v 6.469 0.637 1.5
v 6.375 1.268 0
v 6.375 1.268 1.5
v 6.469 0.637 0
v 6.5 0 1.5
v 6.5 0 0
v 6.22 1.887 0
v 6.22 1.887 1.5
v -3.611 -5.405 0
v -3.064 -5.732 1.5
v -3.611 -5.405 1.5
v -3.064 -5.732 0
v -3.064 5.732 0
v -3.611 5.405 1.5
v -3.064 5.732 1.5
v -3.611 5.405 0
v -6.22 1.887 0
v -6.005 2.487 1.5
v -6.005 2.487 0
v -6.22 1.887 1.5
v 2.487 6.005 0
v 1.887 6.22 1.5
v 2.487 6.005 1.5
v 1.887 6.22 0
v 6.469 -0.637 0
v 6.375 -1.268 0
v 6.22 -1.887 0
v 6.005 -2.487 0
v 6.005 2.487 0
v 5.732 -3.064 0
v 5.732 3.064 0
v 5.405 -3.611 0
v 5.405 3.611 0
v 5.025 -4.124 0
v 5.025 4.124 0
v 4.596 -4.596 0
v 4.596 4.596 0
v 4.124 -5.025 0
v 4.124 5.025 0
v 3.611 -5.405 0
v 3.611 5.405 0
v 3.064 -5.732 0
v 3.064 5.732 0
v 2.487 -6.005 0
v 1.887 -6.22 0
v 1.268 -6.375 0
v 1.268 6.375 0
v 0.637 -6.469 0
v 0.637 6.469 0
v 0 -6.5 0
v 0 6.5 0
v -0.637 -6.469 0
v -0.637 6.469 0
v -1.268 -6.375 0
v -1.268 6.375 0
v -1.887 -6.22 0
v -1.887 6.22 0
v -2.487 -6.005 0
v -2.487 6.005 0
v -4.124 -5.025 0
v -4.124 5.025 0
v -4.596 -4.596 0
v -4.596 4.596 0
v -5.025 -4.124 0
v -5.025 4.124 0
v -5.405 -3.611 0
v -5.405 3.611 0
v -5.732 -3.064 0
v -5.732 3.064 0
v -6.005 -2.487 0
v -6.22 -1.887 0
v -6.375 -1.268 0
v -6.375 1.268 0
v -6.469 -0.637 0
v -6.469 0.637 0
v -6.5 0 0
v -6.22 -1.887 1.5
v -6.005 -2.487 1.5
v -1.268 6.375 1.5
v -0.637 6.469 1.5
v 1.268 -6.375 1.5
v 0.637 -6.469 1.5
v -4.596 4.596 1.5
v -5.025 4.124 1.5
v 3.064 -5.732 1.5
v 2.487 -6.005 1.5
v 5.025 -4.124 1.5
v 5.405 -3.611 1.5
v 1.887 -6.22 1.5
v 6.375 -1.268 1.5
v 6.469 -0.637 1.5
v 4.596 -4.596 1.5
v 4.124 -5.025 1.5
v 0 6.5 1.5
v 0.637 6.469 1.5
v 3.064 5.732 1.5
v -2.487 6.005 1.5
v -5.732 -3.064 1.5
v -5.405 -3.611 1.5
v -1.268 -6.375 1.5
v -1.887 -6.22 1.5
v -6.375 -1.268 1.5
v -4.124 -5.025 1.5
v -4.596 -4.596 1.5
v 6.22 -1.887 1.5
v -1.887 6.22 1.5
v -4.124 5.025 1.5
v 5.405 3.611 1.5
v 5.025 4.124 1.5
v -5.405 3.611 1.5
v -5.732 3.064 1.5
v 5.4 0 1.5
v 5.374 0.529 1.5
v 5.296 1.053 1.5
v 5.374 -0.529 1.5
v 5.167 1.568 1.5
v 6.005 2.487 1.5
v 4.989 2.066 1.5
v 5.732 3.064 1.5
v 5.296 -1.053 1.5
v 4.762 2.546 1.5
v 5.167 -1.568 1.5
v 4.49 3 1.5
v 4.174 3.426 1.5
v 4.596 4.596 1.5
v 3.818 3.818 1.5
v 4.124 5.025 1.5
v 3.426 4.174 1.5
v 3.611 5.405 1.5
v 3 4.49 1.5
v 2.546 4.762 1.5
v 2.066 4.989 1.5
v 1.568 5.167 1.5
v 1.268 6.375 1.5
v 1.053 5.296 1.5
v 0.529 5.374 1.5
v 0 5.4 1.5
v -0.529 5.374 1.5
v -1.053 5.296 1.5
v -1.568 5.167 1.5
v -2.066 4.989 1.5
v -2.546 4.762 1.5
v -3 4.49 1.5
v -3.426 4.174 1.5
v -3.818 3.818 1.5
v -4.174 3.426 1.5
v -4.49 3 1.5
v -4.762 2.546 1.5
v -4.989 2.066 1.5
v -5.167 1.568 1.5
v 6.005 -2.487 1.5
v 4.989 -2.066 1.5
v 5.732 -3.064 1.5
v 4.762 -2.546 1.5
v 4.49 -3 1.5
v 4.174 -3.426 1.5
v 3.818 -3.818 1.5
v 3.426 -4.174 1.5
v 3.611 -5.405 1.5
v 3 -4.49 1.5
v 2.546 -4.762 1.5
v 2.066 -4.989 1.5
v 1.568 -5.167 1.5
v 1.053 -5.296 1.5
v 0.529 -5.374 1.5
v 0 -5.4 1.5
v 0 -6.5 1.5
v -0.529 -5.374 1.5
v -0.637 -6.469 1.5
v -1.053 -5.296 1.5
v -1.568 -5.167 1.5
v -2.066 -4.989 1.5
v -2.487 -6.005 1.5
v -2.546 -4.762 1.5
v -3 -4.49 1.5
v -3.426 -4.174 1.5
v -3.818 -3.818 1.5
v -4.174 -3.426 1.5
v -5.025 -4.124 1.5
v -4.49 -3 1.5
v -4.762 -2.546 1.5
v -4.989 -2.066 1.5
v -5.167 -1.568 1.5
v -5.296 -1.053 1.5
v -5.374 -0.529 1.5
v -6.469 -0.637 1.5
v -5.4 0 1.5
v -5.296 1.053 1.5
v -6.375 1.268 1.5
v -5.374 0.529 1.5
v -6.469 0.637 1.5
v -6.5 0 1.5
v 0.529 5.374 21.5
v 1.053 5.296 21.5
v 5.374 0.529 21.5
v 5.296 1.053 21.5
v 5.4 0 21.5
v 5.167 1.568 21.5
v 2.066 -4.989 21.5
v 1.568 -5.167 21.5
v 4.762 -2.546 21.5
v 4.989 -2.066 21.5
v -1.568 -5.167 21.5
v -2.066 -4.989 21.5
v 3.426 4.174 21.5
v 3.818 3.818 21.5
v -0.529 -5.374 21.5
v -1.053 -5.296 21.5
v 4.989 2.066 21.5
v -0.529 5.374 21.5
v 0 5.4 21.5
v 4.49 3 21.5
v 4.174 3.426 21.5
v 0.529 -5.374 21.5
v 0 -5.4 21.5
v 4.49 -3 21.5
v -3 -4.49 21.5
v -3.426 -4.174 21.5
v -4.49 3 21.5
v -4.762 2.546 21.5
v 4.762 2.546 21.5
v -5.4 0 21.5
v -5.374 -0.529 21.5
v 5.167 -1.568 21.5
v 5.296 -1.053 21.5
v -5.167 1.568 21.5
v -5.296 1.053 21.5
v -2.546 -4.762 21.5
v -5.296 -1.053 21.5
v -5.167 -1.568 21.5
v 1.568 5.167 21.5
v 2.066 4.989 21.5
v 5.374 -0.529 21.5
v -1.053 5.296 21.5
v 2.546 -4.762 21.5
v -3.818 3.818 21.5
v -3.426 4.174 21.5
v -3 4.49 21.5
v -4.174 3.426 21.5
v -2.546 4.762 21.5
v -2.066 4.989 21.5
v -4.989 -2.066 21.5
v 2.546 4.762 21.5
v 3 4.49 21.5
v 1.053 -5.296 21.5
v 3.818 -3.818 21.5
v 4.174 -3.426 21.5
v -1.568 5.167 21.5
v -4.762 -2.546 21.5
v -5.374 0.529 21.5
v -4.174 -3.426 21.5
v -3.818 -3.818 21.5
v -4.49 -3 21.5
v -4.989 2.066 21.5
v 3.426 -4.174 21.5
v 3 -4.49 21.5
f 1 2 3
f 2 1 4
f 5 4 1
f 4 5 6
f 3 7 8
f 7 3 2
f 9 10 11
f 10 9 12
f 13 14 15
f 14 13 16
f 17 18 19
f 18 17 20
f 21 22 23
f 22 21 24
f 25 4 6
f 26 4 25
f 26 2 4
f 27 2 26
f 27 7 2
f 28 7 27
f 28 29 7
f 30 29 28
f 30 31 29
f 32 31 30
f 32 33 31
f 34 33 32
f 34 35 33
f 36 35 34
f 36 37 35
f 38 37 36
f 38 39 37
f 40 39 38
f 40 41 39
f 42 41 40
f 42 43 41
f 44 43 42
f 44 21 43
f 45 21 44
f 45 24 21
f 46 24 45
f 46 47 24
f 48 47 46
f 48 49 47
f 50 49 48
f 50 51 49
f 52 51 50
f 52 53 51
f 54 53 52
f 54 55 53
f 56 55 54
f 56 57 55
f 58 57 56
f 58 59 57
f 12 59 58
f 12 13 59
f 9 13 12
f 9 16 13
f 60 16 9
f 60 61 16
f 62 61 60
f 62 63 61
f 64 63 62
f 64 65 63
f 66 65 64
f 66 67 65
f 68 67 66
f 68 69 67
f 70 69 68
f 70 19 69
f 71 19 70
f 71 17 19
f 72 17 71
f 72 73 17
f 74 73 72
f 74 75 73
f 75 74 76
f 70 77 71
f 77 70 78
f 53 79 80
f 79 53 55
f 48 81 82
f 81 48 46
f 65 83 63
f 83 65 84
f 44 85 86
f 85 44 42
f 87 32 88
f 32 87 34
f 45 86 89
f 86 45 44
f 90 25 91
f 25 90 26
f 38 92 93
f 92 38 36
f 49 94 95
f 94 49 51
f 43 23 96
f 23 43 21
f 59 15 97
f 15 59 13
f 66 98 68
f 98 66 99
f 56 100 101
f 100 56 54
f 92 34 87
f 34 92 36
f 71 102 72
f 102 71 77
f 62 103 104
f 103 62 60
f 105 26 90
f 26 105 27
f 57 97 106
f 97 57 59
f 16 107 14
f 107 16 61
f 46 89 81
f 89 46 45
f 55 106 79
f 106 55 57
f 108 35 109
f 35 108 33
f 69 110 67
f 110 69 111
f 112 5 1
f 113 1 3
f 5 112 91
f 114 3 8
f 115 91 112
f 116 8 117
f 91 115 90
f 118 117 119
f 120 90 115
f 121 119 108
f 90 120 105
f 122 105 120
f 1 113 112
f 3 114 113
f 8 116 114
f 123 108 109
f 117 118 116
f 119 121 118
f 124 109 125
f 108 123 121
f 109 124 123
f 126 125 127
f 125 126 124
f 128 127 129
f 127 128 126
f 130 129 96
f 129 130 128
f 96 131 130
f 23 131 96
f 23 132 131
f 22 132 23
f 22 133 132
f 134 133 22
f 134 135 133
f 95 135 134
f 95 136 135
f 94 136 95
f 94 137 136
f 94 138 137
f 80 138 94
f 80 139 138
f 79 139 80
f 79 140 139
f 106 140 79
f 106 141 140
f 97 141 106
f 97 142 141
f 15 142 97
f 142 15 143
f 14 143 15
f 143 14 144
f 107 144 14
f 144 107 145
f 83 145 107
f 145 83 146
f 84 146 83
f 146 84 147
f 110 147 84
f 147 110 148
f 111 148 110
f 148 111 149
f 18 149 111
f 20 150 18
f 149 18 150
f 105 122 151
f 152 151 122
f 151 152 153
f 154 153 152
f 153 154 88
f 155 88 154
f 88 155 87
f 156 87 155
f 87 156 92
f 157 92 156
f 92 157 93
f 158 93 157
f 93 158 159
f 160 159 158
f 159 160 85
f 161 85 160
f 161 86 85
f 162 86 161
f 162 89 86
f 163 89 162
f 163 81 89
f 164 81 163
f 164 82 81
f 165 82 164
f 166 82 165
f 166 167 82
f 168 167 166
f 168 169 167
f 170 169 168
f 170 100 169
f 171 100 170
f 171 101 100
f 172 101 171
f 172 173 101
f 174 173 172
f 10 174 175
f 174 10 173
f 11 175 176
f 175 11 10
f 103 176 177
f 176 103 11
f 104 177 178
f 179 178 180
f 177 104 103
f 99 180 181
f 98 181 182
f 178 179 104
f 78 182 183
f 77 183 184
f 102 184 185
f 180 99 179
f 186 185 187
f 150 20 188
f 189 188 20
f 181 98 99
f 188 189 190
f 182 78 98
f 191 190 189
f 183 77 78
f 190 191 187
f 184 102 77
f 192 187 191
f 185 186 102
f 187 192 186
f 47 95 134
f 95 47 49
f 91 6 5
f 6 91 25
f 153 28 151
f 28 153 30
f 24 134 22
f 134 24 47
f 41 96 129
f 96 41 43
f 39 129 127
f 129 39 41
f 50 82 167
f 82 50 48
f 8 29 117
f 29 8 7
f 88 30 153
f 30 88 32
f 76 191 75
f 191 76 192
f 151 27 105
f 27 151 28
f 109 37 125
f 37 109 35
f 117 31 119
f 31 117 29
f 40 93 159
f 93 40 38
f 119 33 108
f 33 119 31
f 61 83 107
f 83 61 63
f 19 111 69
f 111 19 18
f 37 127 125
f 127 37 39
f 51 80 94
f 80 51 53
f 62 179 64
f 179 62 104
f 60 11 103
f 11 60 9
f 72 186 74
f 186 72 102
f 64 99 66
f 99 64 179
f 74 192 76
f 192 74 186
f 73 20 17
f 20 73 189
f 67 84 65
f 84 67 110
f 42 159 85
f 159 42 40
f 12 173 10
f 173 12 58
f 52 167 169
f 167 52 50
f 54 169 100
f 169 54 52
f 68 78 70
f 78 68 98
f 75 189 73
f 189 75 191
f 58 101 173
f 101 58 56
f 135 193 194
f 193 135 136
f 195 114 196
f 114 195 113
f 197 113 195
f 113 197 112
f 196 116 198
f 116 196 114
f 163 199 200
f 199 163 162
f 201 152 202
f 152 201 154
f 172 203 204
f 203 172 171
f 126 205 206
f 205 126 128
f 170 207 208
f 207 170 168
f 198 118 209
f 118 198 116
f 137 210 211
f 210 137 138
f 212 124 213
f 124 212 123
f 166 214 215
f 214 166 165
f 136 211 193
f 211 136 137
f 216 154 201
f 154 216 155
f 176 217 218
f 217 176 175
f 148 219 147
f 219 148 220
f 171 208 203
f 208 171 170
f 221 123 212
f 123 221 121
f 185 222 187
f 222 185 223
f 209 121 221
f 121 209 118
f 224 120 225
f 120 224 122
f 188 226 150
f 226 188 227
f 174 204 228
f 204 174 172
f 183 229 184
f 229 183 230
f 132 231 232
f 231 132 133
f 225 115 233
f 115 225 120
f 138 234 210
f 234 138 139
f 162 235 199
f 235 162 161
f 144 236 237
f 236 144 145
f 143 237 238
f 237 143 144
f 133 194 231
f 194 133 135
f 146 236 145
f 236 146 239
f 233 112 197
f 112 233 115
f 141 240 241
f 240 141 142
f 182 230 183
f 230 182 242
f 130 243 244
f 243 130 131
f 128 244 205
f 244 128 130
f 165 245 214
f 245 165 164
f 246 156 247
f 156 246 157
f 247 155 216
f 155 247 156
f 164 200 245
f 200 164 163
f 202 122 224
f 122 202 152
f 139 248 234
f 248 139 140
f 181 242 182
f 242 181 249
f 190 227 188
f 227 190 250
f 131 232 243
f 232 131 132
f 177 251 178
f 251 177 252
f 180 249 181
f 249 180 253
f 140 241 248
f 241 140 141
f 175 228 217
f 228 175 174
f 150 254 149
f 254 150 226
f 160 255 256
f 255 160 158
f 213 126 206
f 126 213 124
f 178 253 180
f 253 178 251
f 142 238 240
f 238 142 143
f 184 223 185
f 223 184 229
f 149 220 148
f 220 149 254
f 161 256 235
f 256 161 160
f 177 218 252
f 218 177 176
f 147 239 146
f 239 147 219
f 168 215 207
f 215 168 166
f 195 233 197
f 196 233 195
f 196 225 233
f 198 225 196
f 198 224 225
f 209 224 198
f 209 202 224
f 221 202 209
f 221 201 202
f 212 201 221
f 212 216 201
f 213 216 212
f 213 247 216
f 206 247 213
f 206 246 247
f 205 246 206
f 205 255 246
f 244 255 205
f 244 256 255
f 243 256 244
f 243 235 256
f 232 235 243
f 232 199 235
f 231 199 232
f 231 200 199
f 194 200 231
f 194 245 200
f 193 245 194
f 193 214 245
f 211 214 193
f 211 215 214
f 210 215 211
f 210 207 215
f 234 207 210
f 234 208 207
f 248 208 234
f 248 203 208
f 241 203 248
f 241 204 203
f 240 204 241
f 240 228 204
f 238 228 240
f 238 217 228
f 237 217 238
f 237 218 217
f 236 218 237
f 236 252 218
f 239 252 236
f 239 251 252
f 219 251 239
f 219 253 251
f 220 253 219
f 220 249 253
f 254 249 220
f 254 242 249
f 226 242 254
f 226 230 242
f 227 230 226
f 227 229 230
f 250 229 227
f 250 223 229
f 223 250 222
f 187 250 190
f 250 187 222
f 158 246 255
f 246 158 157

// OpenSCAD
// --- Dimensions (mm) ---
collar_diameter = 13.0;      // Diameter of the base collar
collar_thickness = 1.5;      // Height of the base collar
sleeve_outer_diameter = 10.8; // Diameter of the main sleeve body
sleeve_height = 21.5;        // Total height from the bed (z=0 to z=21.5)
bore_diameter = 6.2;         // Diameter of the central hole
bore_clearance = 0.1;        // Extra length for cutting to avoid coplanar faces

// --- Constants ---
$fn = 64;

// --- Implementation ---

// The part is printed upside down as requested: 
// The collar lies on the bed (z=0 to 1.5)
// The sleeve rises from the collar to z=21.5

union() {
    // 1. The Base Collar
    cylinder(h = collar_thickness, d = collar_diameter);

    // 2. The Sleeve Body
    // It starts at the top of the collar (z = 1.5) and goes to z = 21.5
    // Total height of the sleeve part = 21.5 - 1.5 = 20.0
    translate([0, 0, collar_thickness])
        cylinder(h = sleeve_height - collar_thickness, d = sleeve_outer_diameter);
}

// 3. The Bore (Subtraction)
// The bore runs through the full height (0 to 21.5)
// We extend the cylinder slightly to ensure a clean cut through the faces
difference() {
    // We wrap the whole assembly in a difference to cut the hole
    // However, to keep the code clean, we subtract from the union above.
    // Since OpenSCAD requires the difference to be the top-level operation:
}

// Corrected structure for subtraction:
difference() {
    // The solid body
    union() {
        cylinder(h = collar_thickness, d = collar_diameter);
        translate([0, 0, collar_thickness])
            cylinder(h = sleeve_height - collar_thickness, d = sleeve_outer_diameter);
    }

    // The hole (bore)
    // We extend it by bore_clearance on both ends to ensure no thin walls remain at the faces
    translate([0, 0, -bore_clearance])
        cylinder(h = sleeve_height + (2 * bore_clearance), d = bore_diameter);
}
